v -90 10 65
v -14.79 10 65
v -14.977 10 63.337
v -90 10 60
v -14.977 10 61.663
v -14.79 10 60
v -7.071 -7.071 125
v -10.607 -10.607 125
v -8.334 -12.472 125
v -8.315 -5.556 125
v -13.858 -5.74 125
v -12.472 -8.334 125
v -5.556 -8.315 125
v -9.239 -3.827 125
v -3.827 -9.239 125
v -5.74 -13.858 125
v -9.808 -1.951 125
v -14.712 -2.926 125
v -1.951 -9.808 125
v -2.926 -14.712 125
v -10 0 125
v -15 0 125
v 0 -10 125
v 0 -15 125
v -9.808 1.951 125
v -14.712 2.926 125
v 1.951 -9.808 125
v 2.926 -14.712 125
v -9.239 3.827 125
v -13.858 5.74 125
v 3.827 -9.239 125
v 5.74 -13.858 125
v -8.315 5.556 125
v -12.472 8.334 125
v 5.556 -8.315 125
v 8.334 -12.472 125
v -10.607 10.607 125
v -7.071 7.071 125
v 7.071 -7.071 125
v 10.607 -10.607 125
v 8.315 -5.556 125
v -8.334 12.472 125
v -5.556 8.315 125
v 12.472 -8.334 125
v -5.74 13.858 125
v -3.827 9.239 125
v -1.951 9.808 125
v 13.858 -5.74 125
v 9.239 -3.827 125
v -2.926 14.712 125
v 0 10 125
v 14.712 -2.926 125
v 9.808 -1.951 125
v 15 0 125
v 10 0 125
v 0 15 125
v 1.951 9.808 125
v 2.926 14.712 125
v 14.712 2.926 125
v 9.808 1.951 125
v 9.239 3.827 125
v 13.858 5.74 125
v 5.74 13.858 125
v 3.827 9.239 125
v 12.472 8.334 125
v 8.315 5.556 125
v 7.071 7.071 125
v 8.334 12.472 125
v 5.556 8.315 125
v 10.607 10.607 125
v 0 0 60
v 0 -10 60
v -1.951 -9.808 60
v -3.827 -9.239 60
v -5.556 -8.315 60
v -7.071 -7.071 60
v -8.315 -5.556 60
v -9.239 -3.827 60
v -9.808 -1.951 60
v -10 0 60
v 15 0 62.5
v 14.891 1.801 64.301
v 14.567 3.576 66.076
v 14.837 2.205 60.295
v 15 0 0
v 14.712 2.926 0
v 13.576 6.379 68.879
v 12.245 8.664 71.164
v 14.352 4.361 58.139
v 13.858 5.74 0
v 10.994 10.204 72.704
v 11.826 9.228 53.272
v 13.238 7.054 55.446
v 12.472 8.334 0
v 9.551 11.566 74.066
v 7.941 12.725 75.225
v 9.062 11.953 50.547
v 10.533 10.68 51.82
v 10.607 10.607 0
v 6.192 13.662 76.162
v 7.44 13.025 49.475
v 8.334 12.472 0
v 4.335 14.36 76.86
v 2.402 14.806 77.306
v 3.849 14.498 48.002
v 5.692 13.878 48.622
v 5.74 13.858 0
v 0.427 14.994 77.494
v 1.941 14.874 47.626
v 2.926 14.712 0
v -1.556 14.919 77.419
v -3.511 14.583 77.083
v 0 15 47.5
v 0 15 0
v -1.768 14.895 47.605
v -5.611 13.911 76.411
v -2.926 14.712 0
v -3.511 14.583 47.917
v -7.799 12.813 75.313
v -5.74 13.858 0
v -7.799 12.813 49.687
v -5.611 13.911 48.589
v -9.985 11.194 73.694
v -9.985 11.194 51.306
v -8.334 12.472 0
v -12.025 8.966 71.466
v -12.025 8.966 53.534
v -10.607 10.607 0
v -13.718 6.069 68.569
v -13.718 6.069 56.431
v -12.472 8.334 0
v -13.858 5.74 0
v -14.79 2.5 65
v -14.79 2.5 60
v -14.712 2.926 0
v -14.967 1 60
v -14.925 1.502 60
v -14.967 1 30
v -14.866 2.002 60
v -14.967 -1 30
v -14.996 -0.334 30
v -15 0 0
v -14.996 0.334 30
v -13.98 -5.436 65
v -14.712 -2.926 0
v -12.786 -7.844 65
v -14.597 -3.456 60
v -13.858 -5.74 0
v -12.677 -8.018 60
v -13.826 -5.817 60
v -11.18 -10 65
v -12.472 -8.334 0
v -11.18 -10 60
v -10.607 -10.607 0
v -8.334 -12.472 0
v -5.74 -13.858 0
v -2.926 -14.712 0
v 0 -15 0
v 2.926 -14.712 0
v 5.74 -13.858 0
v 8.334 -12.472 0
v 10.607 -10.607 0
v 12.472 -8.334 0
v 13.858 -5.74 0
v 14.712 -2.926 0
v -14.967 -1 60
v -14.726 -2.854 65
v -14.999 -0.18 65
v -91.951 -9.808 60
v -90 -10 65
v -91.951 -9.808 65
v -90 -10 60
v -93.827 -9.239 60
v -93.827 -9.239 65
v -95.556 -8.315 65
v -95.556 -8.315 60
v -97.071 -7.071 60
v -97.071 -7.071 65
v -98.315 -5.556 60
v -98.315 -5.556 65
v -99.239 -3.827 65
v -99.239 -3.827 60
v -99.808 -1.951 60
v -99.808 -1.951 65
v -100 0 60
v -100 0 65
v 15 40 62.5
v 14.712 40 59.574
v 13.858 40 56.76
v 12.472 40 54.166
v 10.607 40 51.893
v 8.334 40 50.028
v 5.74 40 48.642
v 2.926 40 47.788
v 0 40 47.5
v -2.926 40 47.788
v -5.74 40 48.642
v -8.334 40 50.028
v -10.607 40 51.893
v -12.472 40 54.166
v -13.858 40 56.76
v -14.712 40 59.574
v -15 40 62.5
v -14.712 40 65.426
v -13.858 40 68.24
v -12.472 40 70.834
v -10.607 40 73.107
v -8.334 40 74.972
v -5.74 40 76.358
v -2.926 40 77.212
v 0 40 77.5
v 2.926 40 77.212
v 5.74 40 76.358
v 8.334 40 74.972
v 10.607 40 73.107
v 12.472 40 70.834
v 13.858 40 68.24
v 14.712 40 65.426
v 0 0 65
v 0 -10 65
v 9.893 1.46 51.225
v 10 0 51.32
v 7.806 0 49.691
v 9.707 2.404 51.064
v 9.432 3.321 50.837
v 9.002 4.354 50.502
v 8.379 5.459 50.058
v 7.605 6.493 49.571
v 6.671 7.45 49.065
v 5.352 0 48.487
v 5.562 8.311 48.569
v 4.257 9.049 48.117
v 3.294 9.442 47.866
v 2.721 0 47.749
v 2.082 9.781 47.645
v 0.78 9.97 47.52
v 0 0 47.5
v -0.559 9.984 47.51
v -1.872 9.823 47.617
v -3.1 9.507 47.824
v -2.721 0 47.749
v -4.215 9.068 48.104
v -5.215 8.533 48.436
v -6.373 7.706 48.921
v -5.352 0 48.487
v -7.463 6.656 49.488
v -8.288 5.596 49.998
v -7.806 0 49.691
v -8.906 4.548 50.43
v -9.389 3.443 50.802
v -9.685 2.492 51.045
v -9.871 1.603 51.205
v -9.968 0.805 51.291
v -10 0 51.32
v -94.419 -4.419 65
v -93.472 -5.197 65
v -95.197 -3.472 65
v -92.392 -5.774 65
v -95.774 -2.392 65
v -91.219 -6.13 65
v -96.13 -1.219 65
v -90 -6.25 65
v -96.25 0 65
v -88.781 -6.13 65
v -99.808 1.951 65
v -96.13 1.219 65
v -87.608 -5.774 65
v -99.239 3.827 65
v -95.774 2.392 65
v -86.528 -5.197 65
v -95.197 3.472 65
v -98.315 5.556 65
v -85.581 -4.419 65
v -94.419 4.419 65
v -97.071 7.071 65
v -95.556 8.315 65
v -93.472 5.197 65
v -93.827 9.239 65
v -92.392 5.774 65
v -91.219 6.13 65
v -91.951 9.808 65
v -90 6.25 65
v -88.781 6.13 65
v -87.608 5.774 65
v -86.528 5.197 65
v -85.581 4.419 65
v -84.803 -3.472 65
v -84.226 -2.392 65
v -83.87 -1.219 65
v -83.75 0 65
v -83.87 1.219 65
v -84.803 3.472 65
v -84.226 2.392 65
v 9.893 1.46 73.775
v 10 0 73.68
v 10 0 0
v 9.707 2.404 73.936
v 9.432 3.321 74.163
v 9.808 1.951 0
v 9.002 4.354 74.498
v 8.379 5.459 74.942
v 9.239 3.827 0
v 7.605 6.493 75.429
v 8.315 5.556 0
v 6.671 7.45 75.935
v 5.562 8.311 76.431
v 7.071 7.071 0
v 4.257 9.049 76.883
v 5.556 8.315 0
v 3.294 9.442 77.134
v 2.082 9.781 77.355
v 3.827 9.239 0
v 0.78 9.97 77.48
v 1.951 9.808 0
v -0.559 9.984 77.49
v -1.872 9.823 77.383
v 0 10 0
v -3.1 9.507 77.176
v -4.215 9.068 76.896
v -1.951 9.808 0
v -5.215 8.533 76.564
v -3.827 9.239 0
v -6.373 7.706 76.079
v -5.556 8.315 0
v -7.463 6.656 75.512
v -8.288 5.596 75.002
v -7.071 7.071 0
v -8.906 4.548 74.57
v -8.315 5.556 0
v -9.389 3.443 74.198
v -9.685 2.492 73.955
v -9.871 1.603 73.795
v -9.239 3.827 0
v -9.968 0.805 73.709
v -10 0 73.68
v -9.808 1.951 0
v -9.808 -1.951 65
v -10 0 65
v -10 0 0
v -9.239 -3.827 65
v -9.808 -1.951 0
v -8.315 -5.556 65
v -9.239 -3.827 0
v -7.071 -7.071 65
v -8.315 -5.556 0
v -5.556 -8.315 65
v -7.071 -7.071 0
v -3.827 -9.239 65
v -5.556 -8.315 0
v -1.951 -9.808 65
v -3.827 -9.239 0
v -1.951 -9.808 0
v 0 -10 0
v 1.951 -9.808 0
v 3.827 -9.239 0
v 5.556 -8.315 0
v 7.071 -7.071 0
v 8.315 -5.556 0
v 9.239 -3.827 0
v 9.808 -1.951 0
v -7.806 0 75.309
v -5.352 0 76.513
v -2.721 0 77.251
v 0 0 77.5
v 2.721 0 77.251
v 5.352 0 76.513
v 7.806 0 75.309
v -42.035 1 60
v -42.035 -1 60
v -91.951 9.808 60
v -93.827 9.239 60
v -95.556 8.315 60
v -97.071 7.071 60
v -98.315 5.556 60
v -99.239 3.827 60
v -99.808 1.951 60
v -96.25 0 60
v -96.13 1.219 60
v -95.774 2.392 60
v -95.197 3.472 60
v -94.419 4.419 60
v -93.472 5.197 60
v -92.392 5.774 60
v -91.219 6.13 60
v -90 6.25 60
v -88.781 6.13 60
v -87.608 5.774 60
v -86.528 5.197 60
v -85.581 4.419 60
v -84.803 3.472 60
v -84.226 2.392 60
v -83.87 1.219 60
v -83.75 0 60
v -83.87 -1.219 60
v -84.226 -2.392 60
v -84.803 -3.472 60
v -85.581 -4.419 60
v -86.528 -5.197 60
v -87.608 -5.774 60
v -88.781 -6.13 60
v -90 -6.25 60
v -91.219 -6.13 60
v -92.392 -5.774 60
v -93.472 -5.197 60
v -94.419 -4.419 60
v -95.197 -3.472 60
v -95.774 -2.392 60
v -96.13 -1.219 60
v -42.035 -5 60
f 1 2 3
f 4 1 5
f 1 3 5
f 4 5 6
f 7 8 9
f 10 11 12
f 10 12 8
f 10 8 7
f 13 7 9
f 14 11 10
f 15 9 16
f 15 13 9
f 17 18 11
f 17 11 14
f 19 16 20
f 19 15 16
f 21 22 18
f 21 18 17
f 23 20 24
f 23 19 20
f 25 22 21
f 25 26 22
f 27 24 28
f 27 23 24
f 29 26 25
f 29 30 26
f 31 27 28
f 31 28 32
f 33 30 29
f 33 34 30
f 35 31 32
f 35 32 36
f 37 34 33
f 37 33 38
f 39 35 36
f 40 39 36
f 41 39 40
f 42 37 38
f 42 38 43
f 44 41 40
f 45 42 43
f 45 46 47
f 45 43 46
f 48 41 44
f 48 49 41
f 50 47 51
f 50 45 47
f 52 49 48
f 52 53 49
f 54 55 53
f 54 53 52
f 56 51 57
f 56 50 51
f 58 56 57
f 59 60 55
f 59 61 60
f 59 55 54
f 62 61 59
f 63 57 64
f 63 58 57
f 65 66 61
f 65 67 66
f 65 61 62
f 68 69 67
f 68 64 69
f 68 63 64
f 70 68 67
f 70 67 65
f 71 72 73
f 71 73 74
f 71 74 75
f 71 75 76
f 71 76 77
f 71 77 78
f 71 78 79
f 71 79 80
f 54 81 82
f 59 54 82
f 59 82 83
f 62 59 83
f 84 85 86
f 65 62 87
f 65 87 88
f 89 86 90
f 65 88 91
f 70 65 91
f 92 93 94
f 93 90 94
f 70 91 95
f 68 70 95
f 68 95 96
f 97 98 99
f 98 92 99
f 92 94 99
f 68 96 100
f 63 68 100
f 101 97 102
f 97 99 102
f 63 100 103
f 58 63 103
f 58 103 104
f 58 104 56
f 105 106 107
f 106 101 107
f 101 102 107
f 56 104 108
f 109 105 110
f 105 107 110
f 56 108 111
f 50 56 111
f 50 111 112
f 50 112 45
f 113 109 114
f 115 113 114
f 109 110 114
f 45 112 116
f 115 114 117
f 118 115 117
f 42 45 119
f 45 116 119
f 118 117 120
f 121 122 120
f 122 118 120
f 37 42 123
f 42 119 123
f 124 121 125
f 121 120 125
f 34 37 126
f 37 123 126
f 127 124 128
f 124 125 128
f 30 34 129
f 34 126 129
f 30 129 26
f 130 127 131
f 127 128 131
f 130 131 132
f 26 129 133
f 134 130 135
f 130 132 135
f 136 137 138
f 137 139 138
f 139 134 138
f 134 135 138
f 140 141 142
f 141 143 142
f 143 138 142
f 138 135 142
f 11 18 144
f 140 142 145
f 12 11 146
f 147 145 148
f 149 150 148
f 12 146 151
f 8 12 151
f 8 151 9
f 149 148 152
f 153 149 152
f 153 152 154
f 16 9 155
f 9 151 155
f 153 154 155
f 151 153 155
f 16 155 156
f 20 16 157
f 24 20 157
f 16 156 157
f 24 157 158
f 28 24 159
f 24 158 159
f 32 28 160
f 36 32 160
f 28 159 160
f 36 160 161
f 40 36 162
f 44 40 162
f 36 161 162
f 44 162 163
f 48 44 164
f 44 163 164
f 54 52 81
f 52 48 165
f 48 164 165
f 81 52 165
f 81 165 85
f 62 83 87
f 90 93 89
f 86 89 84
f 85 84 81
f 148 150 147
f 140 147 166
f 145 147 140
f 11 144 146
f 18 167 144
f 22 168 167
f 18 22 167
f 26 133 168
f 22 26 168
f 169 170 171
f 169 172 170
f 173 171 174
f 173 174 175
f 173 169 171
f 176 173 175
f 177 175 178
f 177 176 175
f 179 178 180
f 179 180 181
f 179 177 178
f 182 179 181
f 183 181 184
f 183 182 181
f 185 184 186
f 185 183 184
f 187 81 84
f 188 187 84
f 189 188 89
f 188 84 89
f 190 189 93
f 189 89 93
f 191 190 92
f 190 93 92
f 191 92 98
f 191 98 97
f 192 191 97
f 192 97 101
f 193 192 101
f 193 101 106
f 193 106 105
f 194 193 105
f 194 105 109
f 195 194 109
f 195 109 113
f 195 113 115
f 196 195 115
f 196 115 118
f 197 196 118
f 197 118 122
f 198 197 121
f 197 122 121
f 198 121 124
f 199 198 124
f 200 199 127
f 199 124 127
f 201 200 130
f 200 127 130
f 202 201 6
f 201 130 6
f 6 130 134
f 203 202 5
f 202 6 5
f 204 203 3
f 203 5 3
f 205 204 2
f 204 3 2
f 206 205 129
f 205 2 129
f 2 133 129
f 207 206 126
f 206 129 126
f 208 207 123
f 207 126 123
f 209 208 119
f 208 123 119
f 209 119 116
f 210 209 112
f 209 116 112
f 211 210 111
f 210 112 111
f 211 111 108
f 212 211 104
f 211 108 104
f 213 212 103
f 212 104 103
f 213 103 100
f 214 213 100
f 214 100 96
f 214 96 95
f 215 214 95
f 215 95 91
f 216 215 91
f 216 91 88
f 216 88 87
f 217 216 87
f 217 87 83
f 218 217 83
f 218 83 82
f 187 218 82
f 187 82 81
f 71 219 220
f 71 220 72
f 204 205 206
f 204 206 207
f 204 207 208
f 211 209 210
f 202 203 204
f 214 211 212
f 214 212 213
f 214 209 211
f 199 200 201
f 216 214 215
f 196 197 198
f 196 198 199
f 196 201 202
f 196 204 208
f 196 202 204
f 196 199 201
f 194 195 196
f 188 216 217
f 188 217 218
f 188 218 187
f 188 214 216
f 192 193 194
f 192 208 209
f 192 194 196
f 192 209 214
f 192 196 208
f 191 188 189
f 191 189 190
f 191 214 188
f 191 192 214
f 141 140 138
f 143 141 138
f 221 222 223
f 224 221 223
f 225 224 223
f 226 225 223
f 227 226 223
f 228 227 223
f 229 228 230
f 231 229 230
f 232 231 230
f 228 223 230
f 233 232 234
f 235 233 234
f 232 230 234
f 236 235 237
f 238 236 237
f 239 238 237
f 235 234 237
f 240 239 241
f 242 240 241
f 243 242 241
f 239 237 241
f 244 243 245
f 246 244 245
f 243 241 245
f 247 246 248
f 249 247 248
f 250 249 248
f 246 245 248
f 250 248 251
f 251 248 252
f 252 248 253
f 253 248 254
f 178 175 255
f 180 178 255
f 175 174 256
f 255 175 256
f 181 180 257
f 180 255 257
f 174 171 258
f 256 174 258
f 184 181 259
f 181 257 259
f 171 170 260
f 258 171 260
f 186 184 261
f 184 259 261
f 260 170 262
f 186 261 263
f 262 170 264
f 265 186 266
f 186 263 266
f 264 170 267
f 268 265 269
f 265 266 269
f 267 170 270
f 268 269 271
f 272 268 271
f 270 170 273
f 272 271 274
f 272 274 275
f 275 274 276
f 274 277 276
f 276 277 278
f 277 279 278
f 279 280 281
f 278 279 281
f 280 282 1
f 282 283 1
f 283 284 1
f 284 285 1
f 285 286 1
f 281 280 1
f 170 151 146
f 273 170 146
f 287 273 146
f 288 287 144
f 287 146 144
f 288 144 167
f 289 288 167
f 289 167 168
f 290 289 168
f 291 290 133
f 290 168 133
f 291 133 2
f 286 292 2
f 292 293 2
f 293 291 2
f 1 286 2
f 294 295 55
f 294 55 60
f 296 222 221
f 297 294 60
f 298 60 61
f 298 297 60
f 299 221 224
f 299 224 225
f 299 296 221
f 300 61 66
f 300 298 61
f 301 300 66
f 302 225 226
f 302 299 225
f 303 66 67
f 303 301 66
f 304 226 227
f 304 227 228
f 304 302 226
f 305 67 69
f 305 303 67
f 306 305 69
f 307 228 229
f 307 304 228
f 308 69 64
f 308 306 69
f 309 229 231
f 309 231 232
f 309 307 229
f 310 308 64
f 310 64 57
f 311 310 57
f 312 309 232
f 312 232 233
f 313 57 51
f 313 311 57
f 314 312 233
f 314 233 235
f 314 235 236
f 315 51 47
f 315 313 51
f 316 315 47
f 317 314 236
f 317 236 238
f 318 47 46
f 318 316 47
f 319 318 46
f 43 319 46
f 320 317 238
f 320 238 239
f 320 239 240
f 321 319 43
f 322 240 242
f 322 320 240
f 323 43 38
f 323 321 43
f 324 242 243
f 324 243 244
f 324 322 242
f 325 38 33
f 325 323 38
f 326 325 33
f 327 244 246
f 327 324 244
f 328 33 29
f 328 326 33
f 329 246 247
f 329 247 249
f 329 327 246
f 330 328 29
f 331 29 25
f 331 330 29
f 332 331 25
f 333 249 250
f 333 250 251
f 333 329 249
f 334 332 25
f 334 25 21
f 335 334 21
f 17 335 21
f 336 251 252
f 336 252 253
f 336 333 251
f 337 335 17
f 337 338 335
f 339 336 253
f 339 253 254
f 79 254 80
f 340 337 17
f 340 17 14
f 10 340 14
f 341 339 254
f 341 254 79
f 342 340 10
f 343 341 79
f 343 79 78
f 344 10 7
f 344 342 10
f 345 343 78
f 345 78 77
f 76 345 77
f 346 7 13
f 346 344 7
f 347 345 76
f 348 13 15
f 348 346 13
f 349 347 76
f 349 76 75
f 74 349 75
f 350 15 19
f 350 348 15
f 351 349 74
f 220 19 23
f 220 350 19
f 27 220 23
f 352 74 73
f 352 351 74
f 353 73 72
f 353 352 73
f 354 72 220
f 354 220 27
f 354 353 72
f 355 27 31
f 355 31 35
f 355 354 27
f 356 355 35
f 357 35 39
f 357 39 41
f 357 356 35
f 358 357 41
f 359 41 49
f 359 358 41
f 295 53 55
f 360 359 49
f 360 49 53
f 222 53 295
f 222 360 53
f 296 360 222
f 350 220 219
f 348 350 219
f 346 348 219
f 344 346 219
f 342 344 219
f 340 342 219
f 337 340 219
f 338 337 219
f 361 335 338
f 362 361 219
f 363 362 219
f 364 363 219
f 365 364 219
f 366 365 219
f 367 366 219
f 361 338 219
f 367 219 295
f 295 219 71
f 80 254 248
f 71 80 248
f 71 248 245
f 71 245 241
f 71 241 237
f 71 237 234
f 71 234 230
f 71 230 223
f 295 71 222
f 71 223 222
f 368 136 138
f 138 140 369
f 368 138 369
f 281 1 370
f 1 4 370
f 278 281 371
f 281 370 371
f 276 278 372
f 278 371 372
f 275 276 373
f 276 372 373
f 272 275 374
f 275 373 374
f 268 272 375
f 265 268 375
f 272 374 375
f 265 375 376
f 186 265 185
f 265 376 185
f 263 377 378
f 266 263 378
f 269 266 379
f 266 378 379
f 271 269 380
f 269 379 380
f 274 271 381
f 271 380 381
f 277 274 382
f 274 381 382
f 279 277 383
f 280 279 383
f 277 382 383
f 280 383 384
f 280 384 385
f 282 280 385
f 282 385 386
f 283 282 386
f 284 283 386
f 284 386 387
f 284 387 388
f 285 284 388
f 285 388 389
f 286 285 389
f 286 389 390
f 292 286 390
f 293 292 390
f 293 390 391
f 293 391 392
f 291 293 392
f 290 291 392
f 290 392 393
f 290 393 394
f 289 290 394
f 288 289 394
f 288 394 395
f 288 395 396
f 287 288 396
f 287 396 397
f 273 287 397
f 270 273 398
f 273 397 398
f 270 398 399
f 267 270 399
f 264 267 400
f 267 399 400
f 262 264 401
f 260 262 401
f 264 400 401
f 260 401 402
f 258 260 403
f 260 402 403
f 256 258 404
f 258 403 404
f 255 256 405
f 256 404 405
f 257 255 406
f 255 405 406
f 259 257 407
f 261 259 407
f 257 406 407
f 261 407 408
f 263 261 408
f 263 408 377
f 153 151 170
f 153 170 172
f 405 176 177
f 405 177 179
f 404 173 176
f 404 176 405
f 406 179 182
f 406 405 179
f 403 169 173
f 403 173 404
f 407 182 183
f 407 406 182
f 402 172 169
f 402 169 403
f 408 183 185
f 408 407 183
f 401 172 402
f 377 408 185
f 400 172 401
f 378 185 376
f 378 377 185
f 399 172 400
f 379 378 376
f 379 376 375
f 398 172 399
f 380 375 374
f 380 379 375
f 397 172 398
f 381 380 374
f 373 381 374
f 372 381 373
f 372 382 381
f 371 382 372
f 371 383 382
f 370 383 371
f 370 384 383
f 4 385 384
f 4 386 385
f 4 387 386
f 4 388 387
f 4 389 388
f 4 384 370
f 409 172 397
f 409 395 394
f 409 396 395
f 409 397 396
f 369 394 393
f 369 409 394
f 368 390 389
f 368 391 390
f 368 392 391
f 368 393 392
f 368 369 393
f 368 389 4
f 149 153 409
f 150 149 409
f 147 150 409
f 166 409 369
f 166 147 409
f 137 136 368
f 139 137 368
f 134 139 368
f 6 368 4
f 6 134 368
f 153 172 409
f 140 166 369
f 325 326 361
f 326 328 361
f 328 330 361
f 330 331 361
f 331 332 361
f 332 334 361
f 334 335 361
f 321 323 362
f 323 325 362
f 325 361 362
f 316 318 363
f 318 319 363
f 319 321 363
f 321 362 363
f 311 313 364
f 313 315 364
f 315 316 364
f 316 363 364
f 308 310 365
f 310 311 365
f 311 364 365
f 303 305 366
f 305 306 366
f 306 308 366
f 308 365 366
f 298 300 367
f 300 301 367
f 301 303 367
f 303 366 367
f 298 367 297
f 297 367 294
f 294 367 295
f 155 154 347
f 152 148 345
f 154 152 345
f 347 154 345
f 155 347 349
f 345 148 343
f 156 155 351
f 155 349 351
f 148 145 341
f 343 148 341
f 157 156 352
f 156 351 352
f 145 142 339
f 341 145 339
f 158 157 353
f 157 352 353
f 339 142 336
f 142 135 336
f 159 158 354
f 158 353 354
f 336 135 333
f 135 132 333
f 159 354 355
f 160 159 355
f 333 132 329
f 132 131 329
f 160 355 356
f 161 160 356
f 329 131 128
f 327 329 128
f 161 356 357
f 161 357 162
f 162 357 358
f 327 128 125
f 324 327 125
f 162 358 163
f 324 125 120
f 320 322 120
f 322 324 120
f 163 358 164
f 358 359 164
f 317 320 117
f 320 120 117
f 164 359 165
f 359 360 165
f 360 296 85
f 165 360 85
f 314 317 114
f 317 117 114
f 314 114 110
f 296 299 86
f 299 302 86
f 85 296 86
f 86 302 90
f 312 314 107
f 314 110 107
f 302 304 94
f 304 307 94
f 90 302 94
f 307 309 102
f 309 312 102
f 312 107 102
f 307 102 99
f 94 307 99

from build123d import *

# Parameters (mm, degrees)
SKETCH1_R               = 15
SKETCH1_R_2             = 10
BOSS_EXTRUDE1_DEPTH     = 125
SKETCH2_R               = 15
BOSS_EXTRUDE2_DEPTH     = 40
SKETCH11_W              = 5
SKETCH11_H              = 20
BOSS_EXTRUDE6_DEPTH     = 100
FILLET1_R               = 10
SKETCH12_W              = 28.03455484
SKETCH12_H              = 2
BOSS_EXTRUDE7_DEPTH     = 30
CUT_EXTRUDE1_DEPTH      = 23
CUT_EXTRUDE1_DEPTH_BACK = 5
SKETCH16_R              = 6.25
CUT_EXTRUDE2_DEPTH      = 7


with BuildPart() as part:
    # Sketch1 → Boss-Extrude1 (new body)
    with BuildSketch(Plane.XY):
        Circle(SKETCH1_R)
        Circle(SKETCH1_R_2, mode=Mode.SUBTRACT)
    extrude(amount=BOSS_EXTRUDE1_DEPTH)

    # Sketch2 → Boss-Extrude2 (add)
    with BuildSketch(Plane(origin=(0, 0, 0), x_dir=(1, 0, 0), z_dir=(0, 1, 0))):
        with Locations((0, -62.5)):
            Circle(SKETCH2_R)
    extrude(amount=BOSS_EXTRUDE2_DEPTH)

    # Sketch11 → Boss-Extrude6 (add)
    with BuildSketch(Plane(origin=(0, 0, 0), x_dir=(0, 0, -1), z_dir=(1, 0, 0))):
        with Locations((-62.5, 0)):
            Rectangle(SKETCH11_W, SKETCH11_H)
    extrude(amount=-BOSS_EXTRUDE6_DEPTH)

    # Fillet1
    fillet1_edges = [part.edges().sort_by_distance(p)[0] for p in [
        (-100, -10, 62.5),
        (-100, 10, 62.5),
    ]]
    fillet(fillet1_edges, radius=FILLET1_R - 0.0001)  # a hair under: the kernel refuses the full size

    # Sketch12 → Boss-Extrude7 (add)
    with BuildSketch(Plane(origin=(0, 0, 60), x_dir=(-1, 0, 0), z_dir=(0, 0, -1))):
        with Locations((28.01727742, 0)):
            Rectangle(SKETCH12_W, SKETCH12_H)
    extrude(amount=BOSS_EXTRUDE7_DEPTH)

    # Sketch13 → Cut-Extrude1 (cut, two sides: drawn at the far end of the back side and taken through both)
    with BuildSketch(Plane(origin=(0, 0, 0), x_dir=(1, 0, 0), z_dir=(0, 1, 0)).offset(-CUT_EXTRUDE1_DEPTH_BACK)):
        Polygon((-14.966629547, -30), (-42.03455484, -60), (-42.03455484, -30), align=None)
    extrude(amount=CUT_EXTRUDE1_DEPTH + CUT_EXTRUDE1_DEPTH_BACK, mode=Mode.SUBTRACT)

    # Sketch16 → Cut-Extrude2 (cut)
    with BuildSketch(Plane(origin=(0, 0, 60), x_dir=(-1, 0, 0), z_dir=(0, 0, -1))):
        with Locations((90, 0)):
            Circle(SKETCH16_R)
    extrude(amount=-CUT_EXTRUDE2_DEPTH, mode=Mode.SUBTRACT)


solid = part.part
